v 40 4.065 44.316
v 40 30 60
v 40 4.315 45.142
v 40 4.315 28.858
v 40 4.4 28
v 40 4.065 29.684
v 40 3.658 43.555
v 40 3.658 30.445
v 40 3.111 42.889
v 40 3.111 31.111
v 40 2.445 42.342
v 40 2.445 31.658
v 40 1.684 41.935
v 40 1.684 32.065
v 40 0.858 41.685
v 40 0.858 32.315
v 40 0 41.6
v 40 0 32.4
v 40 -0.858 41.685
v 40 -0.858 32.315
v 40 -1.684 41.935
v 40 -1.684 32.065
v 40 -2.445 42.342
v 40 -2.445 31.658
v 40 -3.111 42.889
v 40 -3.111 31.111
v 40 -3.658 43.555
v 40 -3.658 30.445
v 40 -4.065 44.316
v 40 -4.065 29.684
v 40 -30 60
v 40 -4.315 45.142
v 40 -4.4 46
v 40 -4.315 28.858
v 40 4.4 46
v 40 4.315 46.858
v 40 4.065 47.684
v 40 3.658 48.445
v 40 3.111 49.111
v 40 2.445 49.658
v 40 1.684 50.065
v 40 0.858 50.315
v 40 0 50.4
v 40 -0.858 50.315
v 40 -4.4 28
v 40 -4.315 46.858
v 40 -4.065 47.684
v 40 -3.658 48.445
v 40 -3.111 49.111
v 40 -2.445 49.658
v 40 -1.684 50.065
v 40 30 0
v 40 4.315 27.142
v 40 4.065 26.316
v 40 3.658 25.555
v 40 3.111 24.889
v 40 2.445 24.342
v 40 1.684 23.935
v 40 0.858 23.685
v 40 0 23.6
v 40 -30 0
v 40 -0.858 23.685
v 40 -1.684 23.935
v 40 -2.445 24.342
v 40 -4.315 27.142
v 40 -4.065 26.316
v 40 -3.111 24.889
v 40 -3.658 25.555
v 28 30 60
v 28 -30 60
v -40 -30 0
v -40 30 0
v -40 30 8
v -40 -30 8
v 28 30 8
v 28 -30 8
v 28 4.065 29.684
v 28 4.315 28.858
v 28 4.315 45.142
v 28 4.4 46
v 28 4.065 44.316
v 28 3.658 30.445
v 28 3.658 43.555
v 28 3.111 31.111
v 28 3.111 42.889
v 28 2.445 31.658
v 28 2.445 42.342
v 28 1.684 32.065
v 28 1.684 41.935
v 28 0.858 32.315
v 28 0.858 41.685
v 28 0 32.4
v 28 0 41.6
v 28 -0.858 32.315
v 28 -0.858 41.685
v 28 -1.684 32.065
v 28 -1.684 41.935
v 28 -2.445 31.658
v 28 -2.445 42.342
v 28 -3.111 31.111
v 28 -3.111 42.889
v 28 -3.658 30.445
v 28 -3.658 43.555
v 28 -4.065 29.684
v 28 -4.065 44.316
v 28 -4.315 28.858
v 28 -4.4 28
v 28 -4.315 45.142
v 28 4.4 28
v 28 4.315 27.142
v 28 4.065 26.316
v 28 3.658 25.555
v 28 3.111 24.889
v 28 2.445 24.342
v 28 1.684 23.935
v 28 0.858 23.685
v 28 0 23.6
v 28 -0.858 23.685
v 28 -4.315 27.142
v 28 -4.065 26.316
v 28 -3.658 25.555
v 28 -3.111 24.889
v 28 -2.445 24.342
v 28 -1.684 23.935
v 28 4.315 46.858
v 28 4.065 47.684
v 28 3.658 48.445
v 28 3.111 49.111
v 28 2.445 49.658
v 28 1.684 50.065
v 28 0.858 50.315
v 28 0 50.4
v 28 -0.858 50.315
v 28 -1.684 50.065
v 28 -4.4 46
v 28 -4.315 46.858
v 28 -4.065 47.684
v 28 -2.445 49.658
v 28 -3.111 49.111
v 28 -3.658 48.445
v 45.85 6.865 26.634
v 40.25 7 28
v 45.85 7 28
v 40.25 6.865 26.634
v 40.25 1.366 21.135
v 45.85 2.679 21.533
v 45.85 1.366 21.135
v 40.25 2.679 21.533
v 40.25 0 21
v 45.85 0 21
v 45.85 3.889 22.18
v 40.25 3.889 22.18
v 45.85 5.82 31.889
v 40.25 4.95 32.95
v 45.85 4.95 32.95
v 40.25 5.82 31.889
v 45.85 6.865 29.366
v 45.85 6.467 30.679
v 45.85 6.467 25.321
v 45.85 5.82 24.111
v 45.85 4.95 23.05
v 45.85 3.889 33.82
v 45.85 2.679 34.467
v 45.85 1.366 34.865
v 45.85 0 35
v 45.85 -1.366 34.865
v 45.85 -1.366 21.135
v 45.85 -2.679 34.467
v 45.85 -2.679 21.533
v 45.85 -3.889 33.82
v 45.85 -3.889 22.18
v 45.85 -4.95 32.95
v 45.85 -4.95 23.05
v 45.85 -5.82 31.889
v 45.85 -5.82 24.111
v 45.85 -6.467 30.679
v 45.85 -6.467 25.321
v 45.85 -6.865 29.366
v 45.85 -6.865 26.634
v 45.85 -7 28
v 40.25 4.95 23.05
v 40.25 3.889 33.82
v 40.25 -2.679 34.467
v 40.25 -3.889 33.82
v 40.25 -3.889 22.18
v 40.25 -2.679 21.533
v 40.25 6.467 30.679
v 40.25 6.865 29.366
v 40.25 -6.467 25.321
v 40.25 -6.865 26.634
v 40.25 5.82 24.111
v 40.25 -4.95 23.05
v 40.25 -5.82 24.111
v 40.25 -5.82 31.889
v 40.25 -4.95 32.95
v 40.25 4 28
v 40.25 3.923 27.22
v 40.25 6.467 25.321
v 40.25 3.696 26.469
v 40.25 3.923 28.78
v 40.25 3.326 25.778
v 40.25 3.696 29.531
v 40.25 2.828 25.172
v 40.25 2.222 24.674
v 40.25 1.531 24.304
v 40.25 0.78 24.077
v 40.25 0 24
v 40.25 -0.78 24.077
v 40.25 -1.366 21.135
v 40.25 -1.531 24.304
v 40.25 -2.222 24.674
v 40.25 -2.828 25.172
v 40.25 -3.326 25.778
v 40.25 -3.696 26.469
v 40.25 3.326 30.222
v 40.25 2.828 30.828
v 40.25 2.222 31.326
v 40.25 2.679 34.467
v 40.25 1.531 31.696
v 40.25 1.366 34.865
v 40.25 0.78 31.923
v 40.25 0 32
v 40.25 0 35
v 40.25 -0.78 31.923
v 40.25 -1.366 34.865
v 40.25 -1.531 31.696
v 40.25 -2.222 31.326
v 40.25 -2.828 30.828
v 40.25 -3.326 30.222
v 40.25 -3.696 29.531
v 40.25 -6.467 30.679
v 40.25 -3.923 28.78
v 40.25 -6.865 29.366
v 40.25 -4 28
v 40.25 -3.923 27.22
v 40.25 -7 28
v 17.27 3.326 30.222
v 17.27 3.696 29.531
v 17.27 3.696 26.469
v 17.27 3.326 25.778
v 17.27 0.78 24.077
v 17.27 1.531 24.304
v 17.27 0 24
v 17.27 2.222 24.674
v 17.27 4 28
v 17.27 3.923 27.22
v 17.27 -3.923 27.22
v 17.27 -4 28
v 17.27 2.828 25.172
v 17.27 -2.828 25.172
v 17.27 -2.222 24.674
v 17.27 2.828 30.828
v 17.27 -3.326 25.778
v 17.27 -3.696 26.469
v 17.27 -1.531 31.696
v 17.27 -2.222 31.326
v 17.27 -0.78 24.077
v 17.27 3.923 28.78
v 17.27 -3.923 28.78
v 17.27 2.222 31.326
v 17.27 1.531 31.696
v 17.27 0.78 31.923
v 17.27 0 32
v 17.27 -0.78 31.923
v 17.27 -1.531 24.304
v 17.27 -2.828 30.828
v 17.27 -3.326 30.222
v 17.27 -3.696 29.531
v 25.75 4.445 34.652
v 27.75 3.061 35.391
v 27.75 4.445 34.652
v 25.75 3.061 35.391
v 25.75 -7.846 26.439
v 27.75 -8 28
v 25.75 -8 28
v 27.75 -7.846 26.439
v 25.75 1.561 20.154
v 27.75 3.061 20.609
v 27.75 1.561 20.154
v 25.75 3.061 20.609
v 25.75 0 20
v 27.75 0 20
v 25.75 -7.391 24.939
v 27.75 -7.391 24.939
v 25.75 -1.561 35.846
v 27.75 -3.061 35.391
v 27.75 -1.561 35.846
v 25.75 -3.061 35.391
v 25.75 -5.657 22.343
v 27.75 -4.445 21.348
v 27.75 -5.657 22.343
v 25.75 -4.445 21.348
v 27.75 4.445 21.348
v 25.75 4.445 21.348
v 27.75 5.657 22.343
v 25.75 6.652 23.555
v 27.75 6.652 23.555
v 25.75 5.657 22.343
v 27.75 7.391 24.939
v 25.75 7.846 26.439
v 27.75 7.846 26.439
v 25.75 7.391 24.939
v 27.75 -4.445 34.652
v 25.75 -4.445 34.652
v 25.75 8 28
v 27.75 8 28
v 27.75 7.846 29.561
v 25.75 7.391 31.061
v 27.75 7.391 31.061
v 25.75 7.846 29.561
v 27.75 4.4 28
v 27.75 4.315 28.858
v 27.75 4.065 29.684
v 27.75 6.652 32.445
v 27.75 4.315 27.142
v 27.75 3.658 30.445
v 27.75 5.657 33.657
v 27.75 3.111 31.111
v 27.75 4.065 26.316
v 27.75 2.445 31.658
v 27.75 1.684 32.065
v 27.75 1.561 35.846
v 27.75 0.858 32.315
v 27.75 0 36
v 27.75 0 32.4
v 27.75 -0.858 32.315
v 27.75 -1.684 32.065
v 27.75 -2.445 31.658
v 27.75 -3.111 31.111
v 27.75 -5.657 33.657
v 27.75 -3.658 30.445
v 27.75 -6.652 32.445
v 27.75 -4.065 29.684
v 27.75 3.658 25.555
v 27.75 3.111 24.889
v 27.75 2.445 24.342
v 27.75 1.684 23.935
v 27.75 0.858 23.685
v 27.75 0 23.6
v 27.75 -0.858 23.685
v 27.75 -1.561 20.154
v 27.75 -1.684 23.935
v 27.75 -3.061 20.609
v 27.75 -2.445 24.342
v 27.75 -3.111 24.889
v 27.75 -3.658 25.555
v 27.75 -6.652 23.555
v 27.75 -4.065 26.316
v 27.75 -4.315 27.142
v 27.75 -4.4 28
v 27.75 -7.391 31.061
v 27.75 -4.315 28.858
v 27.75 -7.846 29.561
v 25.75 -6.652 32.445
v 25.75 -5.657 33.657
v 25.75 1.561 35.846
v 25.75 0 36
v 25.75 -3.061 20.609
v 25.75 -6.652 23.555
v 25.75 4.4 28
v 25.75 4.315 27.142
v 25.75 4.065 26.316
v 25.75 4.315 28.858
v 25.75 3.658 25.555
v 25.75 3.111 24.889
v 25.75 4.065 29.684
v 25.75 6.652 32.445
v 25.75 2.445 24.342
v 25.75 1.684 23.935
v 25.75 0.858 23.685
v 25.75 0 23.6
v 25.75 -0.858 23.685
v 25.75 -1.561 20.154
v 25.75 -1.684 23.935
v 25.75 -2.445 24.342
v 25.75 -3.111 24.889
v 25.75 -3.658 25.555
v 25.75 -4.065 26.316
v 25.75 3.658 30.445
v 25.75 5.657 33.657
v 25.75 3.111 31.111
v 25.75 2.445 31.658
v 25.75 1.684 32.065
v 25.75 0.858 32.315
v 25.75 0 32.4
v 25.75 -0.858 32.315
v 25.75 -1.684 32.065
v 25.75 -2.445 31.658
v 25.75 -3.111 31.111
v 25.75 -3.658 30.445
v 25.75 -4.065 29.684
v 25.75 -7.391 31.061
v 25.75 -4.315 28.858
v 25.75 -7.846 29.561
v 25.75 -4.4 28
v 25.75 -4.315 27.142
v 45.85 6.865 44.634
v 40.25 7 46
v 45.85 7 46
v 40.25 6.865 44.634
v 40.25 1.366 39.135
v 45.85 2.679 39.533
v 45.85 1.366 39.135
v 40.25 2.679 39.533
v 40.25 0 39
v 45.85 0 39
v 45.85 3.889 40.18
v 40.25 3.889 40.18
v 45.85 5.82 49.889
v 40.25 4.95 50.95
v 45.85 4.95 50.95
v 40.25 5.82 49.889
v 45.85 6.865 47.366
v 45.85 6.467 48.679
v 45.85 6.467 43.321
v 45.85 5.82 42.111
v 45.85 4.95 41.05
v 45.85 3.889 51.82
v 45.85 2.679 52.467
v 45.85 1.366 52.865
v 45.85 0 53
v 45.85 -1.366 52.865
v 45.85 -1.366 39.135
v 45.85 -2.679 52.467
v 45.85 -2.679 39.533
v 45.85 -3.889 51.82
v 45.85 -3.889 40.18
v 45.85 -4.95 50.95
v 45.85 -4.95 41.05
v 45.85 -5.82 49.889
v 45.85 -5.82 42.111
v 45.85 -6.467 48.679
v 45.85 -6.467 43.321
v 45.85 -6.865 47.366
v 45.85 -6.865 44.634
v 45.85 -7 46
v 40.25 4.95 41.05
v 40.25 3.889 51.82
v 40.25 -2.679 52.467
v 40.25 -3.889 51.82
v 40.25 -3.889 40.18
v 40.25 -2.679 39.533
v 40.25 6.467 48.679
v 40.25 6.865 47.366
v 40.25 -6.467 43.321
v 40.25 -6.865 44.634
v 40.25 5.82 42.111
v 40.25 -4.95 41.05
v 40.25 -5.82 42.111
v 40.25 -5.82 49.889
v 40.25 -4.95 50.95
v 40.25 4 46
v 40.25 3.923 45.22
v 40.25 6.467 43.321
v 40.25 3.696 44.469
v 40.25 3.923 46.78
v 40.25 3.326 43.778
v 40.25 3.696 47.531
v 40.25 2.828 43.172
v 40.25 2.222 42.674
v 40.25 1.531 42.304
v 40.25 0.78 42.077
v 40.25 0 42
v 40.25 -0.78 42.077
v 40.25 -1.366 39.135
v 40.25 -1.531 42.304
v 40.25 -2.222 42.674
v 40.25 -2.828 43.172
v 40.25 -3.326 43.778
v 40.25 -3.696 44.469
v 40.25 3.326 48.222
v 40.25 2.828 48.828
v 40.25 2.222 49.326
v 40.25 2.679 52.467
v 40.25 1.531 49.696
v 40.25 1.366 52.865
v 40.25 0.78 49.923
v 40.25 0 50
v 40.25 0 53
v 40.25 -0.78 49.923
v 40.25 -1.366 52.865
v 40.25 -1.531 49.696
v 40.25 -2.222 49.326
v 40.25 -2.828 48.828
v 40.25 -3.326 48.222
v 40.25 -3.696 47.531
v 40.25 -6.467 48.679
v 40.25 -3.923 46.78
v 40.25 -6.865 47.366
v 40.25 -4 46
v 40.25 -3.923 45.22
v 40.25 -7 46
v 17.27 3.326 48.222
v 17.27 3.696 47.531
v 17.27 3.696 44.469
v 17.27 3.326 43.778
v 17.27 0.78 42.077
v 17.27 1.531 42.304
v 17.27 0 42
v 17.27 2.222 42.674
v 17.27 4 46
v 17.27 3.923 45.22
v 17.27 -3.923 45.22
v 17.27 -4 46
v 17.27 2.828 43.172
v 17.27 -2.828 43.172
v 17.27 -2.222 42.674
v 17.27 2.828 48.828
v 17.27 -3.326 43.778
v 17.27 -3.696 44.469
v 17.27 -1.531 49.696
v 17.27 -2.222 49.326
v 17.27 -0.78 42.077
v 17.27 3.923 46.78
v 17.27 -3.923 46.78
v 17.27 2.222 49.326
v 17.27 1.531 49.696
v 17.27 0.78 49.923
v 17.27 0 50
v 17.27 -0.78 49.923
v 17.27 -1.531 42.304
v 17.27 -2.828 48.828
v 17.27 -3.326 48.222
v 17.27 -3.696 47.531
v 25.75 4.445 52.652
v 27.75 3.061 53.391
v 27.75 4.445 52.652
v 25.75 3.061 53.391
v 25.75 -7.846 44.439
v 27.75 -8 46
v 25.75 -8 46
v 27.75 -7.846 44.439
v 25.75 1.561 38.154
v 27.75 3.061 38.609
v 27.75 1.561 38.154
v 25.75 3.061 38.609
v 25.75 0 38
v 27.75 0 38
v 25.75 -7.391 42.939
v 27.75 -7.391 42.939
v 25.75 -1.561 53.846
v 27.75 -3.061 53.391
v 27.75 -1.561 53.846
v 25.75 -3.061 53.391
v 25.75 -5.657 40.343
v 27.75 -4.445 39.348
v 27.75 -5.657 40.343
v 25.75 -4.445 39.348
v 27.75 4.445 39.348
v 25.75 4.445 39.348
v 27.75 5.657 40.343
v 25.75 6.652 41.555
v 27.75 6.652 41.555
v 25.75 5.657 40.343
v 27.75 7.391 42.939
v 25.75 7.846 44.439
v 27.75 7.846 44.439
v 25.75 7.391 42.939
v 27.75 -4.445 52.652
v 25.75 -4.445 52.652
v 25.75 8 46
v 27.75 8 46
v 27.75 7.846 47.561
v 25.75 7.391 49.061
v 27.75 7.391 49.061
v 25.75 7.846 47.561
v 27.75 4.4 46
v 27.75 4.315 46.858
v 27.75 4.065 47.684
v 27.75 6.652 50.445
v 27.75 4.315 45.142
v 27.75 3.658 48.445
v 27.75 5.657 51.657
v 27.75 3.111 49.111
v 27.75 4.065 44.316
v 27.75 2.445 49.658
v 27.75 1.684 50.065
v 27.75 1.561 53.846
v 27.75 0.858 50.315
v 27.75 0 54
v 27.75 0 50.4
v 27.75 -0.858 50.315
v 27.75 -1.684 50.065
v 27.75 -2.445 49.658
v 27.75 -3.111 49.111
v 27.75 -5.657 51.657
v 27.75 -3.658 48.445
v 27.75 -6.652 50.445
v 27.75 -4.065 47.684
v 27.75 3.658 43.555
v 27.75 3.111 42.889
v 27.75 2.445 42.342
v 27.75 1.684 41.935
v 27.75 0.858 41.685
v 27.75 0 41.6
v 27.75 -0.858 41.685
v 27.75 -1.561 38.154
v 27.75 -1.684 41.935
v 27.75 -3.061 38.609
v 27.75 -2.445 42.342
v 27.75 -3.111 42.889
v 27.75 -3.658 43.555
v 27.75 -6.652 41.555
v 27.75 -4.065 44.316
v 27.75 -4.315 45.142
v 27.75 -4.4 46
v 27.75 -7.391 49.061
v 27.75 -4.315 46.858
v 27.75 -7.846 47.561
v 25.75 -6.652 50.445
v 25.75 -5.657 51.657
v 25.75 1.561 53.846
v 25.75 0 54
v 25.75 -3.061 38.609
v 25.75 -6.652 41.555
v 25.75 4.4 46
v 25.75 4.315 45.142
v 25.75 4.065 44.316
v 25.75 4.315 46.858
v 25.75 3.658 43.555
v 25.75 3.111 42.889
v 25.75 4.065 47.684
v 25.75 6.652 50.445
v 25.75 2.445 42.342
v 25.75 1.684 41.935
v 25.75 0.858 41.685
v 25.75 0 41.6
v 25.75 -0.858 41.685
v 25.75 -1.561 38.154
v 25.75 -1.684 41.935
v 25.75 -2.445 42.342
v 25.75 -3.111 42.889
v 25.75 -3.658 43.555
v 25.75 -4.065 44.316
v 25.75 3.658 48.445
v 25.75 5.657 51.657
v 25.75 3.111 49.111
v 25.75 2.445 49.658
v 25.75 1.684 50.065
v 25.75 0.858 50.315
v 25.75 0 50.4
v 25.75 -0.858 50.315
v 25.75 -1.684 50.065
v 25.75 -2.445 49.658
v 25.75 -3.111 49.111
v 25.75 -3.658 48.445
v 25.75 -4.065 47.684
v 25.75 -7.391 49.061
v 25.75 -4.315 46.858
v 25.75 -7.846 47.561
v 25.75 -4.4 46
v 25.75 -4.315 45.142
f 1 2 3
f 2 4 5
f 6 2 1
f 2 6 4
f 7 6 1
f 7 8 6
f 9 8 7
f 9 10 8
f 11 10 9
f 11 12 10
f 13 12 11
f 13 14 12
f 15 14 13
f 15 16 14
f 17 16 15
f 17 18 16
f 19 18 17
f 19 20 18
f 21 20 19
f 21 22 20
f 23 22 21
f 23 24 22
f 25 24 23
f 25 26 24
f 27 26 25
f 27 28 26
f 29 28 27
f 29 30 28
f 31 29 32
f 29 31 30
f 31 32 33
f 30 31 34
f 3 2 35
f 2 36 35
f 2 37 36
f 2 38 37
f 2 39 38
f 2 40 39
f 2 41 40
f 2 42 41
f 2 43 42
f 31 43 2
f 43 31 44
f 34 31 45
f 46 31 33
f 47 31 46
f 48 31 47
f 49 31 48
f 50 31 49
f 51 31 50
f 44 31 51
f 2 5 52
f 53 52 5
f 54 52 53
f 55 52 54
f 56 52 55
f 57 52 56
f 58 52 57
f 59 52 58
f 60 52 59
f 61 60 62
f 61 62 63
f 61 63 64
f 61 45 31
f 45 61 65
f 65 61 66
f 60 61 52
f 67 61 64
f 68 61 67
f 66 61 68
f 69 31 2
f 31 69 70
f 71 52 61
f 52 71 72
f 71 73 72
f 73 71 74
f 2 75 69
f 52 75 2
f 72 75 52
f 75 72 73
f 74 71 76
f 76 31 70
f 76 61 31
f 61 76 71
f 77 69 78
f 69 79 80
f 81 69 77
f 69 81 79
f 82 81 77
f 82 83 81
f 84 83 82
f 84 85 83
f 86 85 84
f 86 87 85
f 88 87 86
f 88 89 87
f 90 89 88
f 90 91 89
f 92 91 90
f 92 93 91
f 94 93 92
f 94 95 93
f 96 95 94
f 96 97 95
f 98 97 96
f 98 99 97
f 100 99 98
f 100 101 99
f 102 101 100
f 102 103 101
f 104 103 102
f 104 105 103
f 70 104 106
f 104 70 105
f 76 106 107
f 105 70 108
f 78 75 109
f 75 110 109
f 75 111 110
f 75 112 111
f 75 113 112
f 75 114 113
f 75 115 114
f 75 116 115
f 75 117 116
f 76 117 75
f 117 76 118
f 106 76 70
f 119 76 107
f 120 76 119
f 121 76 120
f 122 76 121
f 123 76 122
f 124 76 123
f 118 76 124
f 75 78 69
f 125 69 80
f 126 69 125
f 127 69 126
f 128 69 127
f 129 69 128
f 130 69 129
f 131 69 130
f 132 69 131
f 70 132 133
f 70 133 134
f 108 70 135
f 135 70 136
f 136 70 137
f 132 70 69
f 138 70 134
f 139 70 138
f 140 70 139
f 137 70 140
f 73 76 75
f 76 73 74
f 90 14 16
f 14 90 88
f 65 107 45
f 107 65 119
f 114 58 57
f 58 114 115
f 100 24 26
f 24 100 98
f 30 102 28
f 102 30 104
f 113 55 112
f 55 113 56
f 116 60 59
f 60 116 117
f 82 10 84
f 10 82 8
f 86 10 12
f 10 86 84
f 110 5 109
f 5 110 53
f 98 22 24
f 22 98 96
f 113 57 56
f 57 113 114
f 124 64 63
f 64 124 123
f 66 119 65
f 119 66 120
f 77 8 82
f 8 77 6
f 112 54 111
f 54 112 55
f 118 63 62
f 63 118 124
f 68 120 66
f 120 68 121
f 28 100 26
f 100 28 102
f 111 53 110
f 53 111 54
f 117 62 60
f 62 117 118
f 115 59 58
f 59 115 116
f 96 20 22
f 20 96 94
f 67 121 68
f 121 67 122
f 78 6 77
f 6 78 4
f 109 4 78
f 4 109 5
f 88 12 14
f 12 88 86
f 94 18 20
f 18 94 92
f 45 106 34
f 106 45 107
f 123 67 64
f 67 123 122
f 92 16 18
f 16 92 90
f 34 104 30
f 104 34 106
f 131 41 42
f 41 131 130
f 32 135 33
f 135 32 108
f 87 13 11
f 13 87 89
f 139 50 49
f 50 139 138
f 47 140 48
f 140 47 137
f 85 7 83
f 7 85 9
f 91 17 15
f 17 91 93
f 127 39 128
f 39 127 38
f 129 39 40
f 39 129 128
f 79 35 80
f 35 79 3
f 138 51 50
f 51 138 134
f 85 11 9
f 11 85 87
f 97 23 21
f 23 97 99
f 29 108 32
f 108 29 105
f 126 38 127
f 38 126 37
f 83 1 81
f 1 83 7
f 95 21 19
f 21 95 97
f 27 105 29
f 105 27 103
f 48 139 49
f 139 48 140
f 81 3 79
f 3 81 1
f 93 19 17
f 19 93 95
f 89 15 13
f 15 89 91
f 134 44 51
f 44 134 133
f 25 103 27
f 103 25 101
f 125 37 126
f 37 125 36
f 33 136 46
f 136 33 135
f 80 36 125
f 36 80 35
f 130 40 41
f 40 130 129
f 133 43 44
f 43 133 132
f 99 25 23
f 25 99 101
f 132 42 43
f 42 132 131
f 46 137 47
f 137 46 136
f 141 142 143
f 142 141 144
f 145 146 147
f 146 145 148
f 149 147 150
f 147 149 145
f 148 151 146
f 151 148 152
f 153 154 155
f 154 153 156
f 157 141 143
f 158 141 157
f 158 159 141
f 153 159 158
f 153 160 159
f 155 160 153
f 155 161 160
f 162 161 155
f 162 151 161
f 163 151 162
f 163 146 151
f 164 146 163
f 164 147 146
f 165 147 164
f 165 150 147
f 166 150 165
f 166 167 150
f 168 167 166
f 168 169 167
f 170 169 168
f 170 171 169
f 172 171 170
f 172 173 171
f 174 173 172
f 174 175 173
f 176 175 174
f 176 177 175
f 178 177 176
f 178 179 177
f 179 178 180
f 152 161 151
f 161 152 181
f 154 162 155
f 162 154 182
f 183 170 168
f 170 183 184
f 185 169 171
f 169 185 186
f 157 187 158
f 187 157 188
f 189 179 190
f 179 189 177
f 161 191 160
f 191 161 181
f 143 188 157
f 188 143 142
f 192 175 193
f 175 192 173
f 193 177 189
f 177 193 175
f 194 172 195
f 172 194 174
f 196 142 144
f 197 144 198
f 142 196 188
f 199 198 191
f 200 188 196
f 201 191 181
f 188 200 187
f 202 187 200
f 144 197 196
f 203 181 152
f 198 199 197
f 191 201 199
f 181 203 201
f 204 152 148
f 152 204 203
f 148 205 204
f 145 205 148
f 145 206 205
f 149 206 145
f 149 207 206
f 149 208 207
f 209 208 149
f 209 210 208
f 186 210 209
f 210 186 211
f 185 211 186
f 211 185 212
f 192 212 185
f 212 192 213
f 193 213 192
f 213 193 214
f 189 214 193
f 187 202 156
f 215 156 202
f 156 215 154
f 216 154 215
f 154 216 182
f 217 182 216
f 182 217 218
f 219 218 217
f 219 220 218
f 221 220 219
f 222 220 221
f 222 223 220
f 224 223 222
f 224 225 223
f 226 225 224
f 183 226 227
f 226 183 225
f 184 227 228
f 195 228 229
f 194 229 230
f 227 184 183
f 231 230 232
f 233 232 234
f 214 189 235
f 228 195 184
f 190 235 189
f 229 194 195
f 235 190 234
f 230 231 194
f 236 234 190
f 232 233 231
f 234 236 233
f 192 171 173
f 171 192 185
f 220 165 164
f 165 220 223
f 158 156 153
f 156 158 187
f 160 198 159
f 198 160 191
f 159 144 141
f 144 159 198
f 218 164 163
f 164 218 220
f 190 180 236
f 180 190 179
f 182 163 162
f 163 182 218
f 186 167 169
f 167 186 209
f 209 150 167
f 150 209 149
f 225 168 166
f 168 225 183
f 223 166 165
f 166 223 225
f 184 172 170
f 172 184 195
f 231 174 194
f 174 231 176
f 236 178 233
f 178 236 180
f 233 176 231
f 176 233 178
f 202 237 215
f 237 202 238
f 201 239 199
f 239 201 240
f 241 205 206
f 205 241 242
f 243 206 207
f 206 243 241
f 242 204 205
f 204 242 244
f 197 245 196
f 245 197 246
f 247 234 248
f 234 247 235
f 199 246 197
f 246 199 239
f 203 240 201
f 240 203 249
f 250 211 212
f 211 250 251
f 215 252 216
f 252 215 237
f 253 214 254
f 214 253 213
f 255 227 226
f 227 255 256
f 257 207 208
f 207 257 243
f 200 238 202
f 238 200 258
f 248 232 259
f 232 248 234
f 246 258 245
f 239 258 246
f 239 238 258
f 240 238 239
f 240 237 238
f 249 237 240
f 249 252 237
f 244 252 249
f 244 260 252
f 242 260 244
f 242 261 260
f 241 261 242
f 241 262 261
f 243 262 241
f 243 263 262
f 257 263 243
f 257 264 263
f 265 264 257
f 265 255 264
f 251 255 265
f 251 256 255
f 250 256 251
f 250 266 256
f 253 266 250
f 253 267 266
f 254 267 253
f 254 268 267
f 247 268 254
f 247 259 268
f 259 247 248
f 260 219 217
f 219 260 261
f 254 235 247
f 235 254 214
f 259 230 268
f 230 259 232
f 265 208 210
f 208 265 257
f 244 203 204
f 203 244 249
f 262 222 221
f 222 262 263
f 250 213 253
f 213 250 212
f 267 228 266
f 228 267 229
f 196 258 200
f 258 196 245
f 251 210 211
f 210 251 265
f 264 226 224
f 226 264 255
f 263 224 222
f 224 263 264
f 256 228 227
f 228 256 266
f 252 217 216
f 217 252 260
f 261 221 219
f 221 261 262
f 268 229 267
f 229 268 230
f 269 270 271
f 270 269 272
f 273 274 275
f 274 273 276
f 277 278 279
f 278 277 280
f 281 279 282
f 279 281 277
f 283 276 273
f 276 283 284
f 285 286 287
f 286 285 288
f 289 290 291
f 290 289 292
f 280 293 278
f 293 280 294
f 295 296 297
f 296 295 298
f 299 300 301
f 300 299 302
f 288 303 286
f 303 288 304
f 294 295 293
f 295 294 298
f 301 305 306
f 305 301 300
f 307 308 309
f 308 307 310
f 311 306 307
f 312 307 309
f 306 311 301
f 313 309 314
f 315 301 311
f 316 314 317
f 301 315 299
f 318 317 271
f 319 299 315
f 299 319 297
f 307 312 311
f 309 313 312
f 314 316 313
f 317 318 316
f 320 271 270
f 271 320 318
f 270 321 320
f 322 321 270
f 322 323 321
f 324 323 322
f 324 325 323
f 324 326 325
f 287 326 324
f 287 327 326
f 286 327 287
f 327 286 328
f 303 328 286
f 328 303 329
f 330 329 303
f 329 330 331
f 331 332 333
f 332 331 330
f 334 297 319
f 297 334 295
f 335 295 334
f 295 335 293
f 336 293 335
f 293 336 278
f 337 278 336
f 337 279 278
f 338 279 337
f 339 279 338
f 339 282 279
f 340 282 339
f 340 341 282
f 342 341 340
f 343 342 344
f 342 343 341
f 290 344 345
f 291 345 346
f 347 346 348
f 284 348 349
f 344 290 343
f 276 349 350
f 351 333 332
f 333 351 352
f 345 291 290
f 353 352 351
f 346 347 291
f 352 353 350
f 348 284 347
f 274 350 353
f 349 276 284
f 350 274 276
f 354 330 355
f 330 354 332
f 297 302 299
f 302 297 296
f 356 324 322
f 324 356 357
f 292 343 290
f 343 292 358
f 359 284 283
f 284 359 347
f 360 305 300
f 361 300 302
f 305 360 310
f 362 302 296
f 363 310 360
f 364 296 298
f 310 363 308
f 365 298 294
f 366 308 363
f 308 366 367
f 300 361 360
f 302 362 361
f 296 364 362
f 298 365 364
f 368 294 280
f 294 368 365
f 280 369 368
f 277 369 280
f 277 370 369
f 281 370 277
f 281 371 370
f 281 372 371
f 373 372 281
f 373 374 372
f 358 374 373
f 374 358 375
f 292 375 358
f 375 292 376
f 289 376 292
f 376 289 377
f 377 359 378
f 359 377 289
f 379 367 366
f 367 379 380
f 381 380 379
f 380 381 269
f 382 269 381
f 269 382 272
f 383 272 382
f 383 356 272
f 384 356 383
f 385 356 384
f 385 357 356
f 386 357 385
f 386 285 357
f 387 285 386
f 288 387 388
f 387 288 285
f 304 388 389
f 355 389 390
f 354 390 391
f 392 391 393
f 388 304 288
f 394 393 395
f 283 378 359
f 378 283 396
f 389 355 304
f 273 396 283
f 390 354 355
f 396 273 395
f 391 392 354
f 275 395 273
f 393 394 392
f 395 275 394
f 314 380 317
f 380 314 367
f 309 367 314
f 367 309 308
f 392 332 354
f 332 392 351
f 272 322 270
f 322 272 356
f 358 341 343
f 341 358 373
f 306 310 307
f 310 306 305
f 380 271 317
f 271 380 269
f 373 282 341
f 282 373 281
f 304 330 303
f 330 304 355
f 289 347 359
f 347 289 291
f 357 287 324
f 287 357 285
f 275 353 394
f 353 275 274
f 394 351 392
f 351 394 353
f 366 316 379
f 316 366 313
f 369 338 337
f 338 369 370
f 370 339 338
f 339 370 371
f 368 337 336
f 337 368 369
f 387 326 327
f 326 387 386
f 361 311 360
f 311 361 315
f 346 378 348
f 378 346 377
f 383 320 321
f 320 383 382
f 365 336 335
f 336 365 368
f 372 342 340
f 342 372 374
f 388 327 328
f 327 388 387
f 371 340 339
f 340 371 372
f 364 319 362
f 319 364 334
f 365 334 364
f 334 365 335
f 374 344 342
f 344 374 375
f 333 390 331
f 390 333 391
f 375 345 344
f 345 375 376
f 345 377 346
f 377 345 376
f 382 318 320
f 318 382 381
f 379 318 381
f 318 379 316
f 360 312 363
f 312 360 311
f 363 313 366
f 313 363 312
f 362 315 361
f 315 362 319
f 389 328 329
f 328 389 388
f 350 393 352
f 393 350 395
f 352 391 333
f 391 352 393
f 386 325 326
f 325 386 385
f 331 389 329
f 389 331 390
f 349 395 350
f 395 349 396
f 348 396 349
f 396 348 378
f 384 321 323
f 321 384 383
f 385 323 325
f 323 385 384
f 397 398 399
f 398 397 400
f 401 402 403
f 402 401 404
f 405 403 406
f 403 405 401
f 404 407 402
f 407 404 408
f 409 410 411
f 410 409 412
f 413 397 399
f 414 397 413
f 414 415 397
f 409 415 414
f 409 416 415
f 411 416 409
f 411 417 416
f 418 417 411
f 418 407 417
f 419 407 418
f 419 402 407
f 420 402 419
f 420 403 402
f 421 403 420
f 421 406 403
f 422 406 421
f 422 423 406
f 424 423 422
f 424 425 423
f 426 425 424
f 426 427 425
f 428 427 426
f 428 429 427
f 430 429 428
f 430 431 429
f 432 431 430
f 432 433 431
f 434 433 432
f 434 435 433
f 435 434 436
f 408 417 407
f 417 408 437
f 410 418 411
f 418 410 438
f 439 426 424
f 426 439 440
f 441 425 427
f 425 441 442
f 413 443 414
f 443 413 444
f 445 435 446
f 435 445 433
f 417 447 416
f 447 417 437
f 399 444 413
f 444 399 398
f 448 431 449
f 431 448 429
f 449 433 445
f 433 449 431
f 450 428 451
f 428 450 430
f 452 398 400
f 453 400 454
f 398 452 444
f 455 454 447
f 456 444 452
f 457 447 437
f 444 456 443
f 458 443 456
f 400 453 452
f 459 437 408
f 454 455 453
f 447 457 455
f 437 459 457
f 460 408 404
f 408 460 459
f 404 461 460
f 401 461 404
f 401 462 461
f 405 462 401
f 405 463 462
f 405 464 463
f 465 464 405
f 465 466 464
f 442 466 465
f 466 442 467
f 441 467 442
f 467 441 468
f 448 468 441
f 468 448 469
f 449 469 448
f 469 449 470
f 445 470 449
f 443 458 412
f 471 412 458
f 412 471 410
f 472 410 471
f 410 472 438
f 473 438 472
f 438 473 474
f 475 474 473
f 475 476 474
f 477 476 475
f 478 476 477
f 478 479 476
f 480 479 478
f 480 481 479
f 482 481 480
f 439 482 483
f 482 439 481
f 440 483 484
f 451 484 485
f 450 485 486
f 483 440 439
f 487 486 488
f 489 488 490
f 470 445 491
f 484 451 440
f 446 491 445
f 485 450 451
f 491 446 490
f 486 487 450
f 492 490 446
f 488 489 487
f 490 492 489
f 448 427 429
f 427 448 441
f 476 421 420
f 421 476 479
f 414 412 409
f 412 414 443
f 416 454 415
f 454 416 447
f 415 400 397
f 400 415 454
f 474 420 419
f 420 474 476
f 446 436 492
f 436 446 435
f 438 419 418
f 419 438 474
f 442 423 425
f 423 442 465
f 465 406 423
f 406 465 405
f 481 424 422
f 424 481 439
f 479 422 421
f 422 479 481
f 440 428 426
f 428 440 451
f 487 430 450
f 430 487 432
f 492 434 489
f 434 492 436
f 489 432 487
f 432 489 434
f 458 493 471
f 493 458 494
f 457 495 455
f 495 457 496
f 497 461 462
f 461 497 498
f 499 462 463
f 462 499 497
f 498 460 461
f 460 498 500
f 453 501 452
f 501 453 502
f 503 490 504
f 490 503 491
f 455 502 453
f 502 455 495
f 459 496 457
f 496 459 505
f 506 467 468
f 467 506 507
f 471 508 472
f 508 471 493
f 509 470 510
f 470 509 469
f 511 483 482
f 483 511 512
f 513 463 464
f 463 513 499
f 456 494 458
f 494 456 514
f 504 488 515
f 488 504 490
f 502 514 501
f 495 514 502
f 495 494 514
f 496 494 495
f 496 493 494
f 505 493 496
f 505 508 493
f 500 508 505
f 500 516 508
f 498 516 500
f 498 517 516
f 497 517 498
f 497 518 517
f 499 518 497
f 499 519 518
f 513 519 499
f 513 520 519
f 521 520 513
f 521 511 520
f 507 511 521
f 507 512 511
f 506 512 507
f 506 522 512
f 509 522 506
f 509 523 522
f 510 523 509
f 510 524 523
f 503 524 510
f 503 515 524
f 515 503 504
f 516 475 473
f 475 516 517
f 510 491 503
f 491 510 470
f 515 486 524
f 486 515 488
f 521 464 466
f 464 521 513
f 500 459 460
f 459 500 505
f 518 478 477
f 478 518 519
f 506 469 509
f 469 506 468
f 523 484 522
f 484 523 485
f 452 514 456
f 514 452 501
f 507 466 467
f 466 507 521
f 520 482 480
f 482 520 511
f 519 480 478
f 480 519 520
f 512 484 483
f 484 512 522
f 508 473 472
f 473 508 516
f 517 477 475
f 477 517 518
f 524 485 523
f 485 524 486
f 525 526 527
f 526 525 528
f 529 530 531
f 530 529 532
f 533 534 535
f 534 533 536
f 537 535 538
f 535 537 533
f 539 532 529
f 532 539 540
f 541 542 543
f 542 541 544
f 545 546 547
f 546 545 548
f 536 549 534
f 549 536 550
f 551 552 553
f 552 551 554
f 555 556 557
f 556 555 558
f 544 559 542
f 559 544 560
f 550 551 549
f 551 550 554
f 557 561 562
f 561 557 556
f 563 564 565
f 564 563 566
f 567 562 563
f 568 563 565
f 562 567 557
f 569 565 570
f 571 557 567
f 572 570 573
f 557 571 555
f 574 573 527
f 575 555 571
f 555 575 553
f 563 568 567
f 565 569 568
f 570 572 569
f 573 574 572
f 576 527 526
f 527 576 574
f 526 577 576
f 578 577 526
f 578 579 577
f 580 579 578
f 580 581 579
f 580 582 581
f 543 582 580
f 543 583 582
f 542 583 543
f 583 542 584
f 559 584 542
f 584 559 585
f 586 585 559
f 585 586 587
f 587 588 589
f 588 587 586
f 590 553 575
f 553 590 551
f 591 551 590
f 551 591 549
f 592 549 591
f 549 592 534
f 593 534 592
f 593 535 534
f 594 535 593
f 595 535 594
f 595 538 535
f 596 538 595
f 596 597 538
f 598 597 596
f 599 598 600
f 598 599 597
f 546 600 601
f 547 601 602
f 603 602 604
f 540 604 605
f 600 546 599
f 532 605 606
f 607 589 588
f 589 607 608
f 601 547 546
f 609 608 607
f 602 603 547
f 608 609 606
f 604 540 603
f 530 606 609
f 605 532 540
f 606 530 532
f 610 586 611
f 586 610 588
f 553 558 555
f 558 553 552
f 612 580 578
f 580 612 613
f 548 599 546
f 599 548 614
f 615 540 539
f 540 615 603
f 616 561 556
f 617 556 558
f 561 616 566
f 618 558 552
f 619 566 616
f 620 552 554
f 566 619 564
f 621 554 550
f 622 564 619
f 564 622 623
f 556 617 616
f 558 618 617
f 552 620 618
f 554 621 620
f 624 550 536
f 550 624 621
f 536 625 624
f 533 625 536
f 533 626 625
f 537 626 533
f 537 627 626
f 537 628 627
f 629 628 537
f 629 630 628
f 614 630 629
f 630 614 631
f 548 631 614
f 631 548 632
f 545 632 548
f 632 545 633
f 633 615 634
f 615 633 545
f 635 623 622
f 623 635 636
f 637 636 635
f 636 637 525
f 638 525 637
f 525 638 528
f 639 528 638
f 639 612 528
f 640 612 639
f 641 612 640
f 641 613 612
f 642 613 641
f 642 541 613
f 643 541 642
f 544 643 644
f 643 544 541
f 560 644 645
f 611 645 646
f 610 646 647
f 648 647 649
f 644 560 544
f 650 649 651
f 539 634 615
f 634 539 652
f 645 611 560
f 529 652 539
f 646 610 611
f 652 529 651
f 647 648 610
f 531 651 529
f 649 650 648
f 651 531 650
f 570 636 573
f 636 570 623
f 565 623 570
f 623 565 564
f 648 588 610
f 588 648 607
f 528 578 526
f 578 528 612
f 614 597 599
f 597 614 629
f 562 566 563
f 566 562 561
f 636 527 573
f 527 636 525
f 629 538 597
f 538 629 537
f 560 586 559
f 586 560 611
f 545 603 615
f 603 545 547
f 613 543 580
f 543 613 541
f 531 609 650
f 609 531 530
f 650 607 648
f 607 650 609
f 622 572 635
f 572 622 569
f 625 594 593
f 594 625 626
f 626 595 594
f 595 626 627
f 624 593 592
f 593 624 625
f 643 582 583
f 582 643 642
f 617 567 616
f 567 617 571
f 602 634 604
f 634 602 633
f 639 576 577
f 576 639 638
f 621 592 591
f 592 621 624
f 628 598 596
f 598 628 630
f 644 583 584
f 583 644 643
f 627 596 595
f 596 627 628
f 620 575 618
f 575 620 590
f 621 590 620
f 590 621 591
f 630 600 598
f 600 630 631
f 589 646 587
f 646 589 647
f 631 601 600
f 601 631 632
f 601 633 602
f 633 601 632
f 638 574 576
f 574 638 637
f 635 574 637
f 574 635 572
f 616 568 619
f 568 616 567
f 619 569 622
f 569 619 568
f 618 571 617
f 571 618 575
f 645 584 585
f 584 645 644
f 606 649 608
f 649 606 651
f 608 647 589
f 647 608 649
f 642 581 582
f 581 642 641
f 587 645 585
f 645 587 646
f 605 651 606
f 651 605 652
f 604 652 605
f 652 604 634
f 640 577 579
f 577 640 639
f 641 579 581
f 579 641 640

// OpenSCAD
$fn = 32;

// ------------------------------------------------------------------------
// Bolted bracket: 80 x 60 mm bracket with 2 bolt joints
// Every part is its own module, assembly() places them once.
// ------------------------------------------------------------------------

// --- part 1 ---
module bracket() {
  difference() {
    translate([-40, -30, 0]) cube([80, 60, 60]);
    translate([-41, -31, 8]) cube([69, 62, 53]);
    translate([34, 0, 28]) rotate([0, 90, 0]) cylinder(h = 14, d = 8.8, center = true);
    translate([34, 0, 46]) rotate([0, 90, 0]) cylinder(h = 14, d = 8.8, center = true);
  }
}

// --- part 2 ---
module bolt1() {
  cylinder(h = 5.6, d = 14);
  translate([0, 0, -22.98]) cylinder(h = 22.98, d = 8);
}

// --- part 3 ---
module washer1() {
  difference() {
      translate([0, 0, 0]) cylinder(h = 2, d = 16);
      translate([0, 0, -1]) cylinder(h = 4, d = 8.8);
    }
}

// --- part 4 ---
module bolt2() {
  cylinder(h = 5.6, d = 14);
  translate([0, 0, -22.98]) cylinder(h = 22.98, d = 8);
}

// --- part 5 ---
module washer2() {
  difference() {
      translate([0, 0, 0]) cylinder(h = 2, d = 16);
      translate([0, 0, -1]) cylinder(h = 4, d = 8.8);
    }
}

// --- assembly ---
module assembly() {
  translate([0, 0, 0]) rotate([0, 0, 0]) bracket();
  translate([40.25, 0, 28]) rotate([0, 90, 0]) bolt1();
  translate([25.75, 0, 28]) rotate([0, 90, 0]) washer1();
  translate([40.25, 0, 46]) rotate([0, 90, 0]) bolt2();
  translate([25.75, 0, 46]) rotate([0, 90, 0]) washer2();
}

assembly();
